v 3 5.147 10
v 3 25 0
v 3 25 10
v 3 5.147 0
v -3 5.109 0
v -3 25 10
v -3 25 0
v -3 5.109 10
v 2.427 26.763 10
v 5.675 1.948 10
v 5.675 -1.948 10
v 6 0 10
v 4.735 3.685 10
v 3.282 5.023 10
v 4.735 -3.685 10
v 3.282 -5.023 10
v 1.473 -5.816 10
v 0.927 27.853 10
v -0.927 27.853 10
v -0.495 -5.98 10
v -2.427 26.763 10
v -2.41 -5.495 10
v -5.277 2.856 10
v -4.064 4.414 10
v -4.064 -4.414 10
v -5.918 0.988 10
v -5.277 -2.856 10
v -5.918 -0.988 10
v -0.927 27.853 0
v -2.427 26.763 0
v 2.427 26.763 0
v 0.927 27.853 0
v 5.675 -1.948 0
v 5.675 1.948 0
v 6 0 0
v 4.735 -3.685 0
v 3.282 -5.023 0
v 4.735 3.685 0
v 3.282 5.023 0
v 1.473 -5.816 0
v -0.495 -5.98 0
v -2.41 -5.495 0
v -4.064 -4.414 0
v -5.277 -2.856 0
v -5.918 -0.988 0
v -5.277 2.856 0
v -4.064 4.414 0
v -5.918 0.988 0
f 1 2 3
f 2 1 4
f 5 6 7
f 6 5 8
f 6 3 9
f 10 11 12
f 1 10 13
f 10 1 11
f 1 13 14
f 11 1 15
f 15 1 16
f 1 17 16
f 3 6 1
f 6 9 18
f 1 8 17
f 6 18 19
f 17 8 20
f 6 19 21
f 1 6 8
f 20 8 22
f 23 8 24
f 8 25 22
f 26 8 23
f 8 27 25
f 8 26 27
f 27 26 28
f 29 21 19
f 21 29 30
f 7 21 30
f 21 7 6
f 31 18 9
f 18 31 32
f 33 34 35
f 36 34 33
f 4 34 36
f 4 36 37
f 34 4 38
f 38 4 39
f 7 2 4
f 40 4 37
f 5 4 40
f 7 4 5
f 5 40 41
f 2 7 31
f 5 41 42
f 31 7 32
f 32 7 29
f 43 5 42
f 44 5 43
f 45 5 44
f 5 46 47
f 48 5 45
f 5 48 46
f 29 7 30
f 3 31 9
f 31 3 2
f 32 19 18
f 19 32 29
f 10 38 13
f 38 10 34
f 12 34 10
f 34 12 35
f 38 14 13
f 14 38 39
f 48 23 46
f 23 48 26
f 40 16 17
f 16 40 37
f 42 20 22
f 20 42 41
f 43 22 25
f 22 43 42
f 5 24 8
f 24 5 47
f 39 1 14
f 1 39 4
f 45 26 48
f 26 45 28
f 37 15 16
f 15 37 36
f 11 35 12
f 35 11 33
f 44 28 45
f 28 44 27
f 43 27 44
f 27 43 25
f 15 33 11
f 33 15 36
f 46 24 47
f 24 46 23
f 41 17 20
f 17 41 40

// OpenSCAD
// LibFile: utilities.scad
//   A collection of utilities originally developed for the OpenFlexure
//   microscope.
//   
//   (c) Richard Bowman, January 2016
//   Released under the CERN Open Hardware License

// Until we figure out a neater way to do this, I am using a commoncode
// block to include this file for the examples.  Using the Include: block
// will be confusing because we don't install it in the libraries folder
// by default...
// CommonCode:
//    use <./openscad/libs/utilities.scad>;


// Function: tiny()
// Description: 
//   This is a tiny distance. In many places, it is helpful to shift
//   surfaces by a small distance, e.g. to ensure overlap or avoid
//   degenerate points.  `tiny()` is that distance, currently 0.05.
//   
//   `tiny()` was formerly known as `d` in the code 
//   but that caused confusion with diameters.
function tiny() = 0.05;

// Function: zero_z()
// Usage: zero_z(vector)
// Description: 
//   Return a copy of a 3-element vector, with the third (z) component set to 0
function zero_z(size) = [size.x, size.y, 0]; //set the Z component of a 3-vector to 0

function if_undefined_set_default(argument, default) = is_undef(argument) ? default : argument;

// Function: translate_x()
// Usage: translate_x(dist)
// Description: 
//   Translate in the X direction.  Equivalent to `translate([dist, 0, 0])`.
module translate_x(x_tr){
    translate([x_tr, 0, 0]){
        children();
    }
}

// Function: translate_y()
// Usage: translate_y(dist)
// Description: 
//   Translate in the Y direction.  Equivalent to `translate([0, dist, 0])`.
module translate_y(y_tr){
    translate([0, y_tr, 0]){
        children();
    }
}

// Function: translate_z()
// Usage: translate_z(dist)
// Description: 
//   Translate in the Z direction.  Equivalent to `translate([0, 0, dist])`.
module translate_z(z_tr){
    translate([0, 0, z_tr]){
        children();
    }
}

// Function: rotate_x()
// Usage: rotate_x(angle)
// Description: Rotate about X axis. Equivalent to `rotate([angle, 0, 0])`.
module rotate_x(x_angle){
    rotate([x_angle, 0, 0]){
        children();
    }
}

// Function: rotate_y()
// Usage: rotate_y(angle)
// Description: Rotate about Y axis. Equivalent to `rotate([0, angle, 0])`.
module rotate_y(y_angle){
    rotate([0, y_angle, 0]){
        children();
    }
}

// Function: rotate_z()
// Usage: rotate_z(angle)
// Description: Rotate about Z axis. Equivalent to `rotate([0, 0, angle])`.
module rotate_z(z_angle){
    rotate([0, 0, z_angle]){
        children();
    }
}

// Function: reflect()
// Usage: reflect(axis)
// Arguments:
//   axis = a 2- or 3D vector giving the axis to reflect in
// Description:
//   Duplicate the children of this module, once unmodified, and
//   once mirrored about the specified axis.  The mirrored copy
//   is equivalent to `mirror(axis) children()`.
//   
//   Conveninece functions `reflect_x`, `reflect_y`, and `reflect_z`
//   are defined to reflect about the respective axes.
// Examples(3D):
//   reflect([1,0,0]) translate([10,0,0]) cube(10);
//   reflect_x() translate([10,0,0]) cube(10);
module reflect(axis){
    //reflects children about the origin, keeping the originals
    children();
    mirror(axis){
        children();
    }
}


module reflect_x(){
    //shorthand for reflecting in x
    reflect([1, 0, 0]){
        children();
    }
}

module reflect_y(){
    //shorthand for reflecting in y
    reflect([0, 1, 0]){
        children();
    }
}

module reflect_z(){
    //shorthand for reflecting in z
    reflect([0, 0, 1]){
        children();
    }
}


function vector_mirror_x(vec) = _vector_mirror_axis(vec, 0);
function vector_mirror_y(vec) = _vector_mirror_axis(vec, 1);
function vector_mirror_z(vec) = _vector_mirror_axis(vec, 2);

function _vector_mirror_axis(vec, axis_index) = [
    for (i = [0:len(vec)-1])
        if (i==axis_index)
            -vec[i]
        else
            vec[i]
];

// Module: repeat()
// Usage: repeat(delta, N, center=false)
// Arguments:
//   delta = vector specifying the displacement between adjacent copies
//   N = total number of copies
//   ---
//   center = The default, `false`, places the first copy at its original location and the last is displaced by `(N-1)*delta`.  Set to `true` to centre the copies on the original location.
// Description:
//   Create a linear arry of copies of a geometry.
// Examples:
//   repeat([10,0,0], 4) cube(5);
//   repeat([10,0,0], 4, center=true) cube(5, center=true);
module repeat(delta, N, center=false){
    //repeat children along a regular array
    center_tr = (center ?  -(N-1)/2 : 0) * delta;
    translate(center_tr){
        for(i=[0:1:(N-1)]){
            translate(i*delta){
                children();
            }
        }
    }
}

module xz_slice(y=0){
    //slice out just the part of something that sits in the XZ plane
    intersection(){
        translate_y(y){
            cube([999,2*tiny(),999],center=true);
        }
        children();
    }
}

module tube(ri, ro, h, center=false){
    difference(){
        cylinder(r=ro, h=h, center=center);
        if (center){
            cylinder(r=ri, h=h+1, center=true);
        }
        else {
            translate_z(-1){
                cylinder(r=ri, h=h+2, center=false);
            }
        }
    }
}

// Module: m4_selftap_hole()
// Usage: m4_selftap_hole(h=5)
// Description:
//   Use to create a hole for an m4 machine screw to self tap into screw using a `difference()`
//   operation. This is a triangular cross-section hole.
module m4_selftap_hole(h=10, center=false){
    // r and flat calculated from the trylinder selftap function used for years.
    // Moving to explicit tested number rather than arbitary calculations.
    trylinder(r=1.3, flat=1.73, h=h, center=center);
}

// Module: no2_selftap_hole()
// Usage: no2_selftap_hole(h=5)
// Description:
//   Use to create a hole for a No2 self-tap screw using a `difference()` operation.
//   This is a triangular cross-section hole.
module no2_selftap_hole(h=10, center=false){
    //This value for r came from test prints. ranging r from 0.3 to 0.5.
    trylinder(r=.3, flat=1.73, h=h, center=center);
}

module no2_selftap_clearancehole(h=10, center=false){
    cylinder(d=2.5, h=h, center=center);
}

module no2_selftap_counterbore(bore_h=999, hole_h=999, flip_z=false, tight=false){
    $fn = 14;
    bore_d = tight ? 4.8 : 5.6;
    generic_counterbore(bore_d=bore_d, bore_h=bore_h, hole_d=2.5, hole_h=hole_h, flip_z=flip_z);
}

// Counterbored through hole for an m3 cap screw counterbore is above z=0
// through hole is below z=0. If flip_z is used the hole is not only flipped in z,
// it is also designed so that the counterbore can print prperly upsidedown
module m3_cap_counterbore(bore_h=999, hole_h=999, flip_z=false){
    $fn = 14;
    generic_counterbore(bore_d=6.5, bore_h=bore_h, hole_d=3.5, hole_h=hole_h, flip_z=flip_z);
}

module generic_counterbore(bore_d, bore_h, hole_d, hole_h, flip_z=false){
    if (flip_z){
        hole_from_bottom(r=hole_d/2, h=hole_h, big_bottom=false);
        translate_z(-(bore_h-tiny())){
            cylinder(d=bore_d, h=bore_h+tiny());
        }
    }
    else{
        translate_z(-hole_h){
            cylinder(d=hole_d, h=hole_h+tiny());
        }
        cylinder(d=bore_d, h=bore_h);
    }
}

module nut(d,h=undef,center=false,fudge=1.18,shaft=false){
    //make a nut, for metric bolt of nominal diameter d
    //d: nominal bolt diameter (e.g. 3 for M3)
    //h: height of nut
    //center: works as for cylinder
    //fudge: multiply the diameter by this number (1.22 works when vertical)
    //shaft: include a long cylinder representing the bolt shaft, diameter=d*1.05
    height = if_undefined_set_default(h, d*0.8);
    union(){
        cylinder(h=height,center=center,r=0.9*d*fudge,$fn=6);
        if(shaft){
            cylinder(r=d/2*1.05*(fudge+1)/2,h=999,$fn=16,center=true);
        }
    }
}

module nut_from_bottom(d,h=undef,fudge=1.2,shaft=true,chamfer_r=0.75,chamfer_h=0.75){
    //make a nut, for metric bolt of nominal diameter d
    //d: nominal bolt diameter (e.g. 3 for M3)
    //h: height of nut
    //center: works as for cylinder
    //fudge: multiply the diameter by this number (1.22 works when vertical)
    //shaft: include a long cylinder representing the bolt shaft, diameter=d*1.05
    height = if_undefined_set_default(h, d*0.8);
    union(){
        cylinder(h=height,r=0.9*d*fudge,$fn=6);
        translate_z(-0.05){
            cylinder(h=chamfer_h,r1=0.9*d*fudge+chamfer_r,r2=0.9*d*fudge,$fn=6);
        }
        mirror([0,0,1]){
            cylinder(h=999,r=0.9*d*fudge+chamfer_r,$fn=6);
        }
        if(shaft){
            sr=d/2*1.05*(fudge+1)/2; //radius of shaft
            translate_z(height/2){
                cylinder(r=sr,h=999,$fn=16,center=true);
            }
            //add a little cut to the roof of the surface so the initial bridges don't have to span the hole.
            intersection(){
                union(){
                    translate_z(height){
                        cube([999,sr*2,0.5],center=true);
                    }
                    translate_z(height+0.25){
                        cube([sr*2,sr*2,0.5],center=true);
                    }
                }
                cylinder(h=height+1,r=0.9*d*fudge,$fn=6);
            }
        }
    }
}

module nut_y(d,h=undef,center=false,fudge=1.15,extra_height=0.7,shaft_length=0){
    //make a nut, for metric bolt of nominal diameter d
    //d: nominal bolt diameter (e.g. 3 for M3)
    //h: height of nut
    //center: works as for cylinder
    //fudge: multiply the diameter by this number (1.22 works when vertical)
    //shaft: include a long cylinder representing the bolt shaft, diameter=d*1.05
    height = if_undefined_set_default(h, d*0.8);
    r=0.9*d*fudge;
    union(){
        rotate([-90, 0, 0]){
            cylinder(h=height,center=center,r=r,$fn=6);
        }

        if(shaft_length > 0){
            sl = shaft_length>0 ? shaft_length : 999;
            translate_y(height/2){
                reflect_y(){
                    cylinder_with_45deg_top(h=sl,r=d/2*1.05*fudge,$fn=16,extra_height=extra_height);
                }
            }
            //Center could be used instead of reflect
        }

        // extra space on top 
        center_y = center ? -height/2 : 0;
        flat_length = 2*r*sin(30);
        center_to_flat = r*cos(30);

        translate([-flat_length/2, center_y ,0]){
            cube([flat_length, height, center_to_flat+extra_height]);
        }

    }
}

// Module: cyl_slot()
// Usage: cyl_slot(r=1, h=1, dy=2, center=false)
// Description: An elongated cylinder use to make a slot for a screw. Slot is oriented in the y direction
// Arguments:
//   r = raduis of the slots
//   h = the height
//   dy = the length of the slot (centre to centre on circles) total length is dy+2*r
//   center = if true the shape is centred on all axes.
// Examples:
//   cyl_slot(r=2, h=10, dy=20);
module cyl_slot(r=1, h=1, dy=2, center=false){

    hull(){
        repeat([0, dy, 0], 2, center=true){
            cylinder(r=r, h=h, center=center);
        }
    }
}

keyhole(10, 6, 3, 25, center=false);
// Module: keyhole()
// Usage: keyhole(h, r_hole, r_slot, l_slot, center=false)
// Arguments:
//   h = height of the keyhole shape
//   r_hole = radius of the larger hole.
//   r_slot = radius of the slot.
//   l_slot = length of the slot (y-dir), from centre of hole to centre of circle at top of slot.
//   ---
//   center = The default, `false`, Whether the shape is centred in z.
// Description:
//   Create a keyhole shaped prism. Main lobe centred at (x,y) = (0,0). Slot
//   in the y-direction.
// Examples:
//   keyhole(10, 2.5, 1.6, 5, center=false);
module keyhole(h, r_hole, r_slot, l_slot, center=false){
    translate_y(l_slot/2){
        cyl_slot(r=r_slot, h=h, dy=l_slot, center=center);
    }
    cylinder(r=r_hole, h=h, center=center);
}

// Module: unrotate()
// Usage: unrotate(rotation)
// Description: 
//   Undoing a rotation is not as simple as `rotate(-rotation)` because
//   `rotate()` applies three separate rotations in order.
//   `unrotate()` reverses this, by applying the rotations in reverse order.
// Example(3D):
//   angles = [30, 60, 45];
//   unrotate(angles) rotate(angles) cylinder(r=2, h=10);
// Example(3D):
//   // This doesn't undo the rotation as you might expect!
//   angles = [30, 60, 45];
//   rotate(-angles) rotate(angles) cylinder(r=2, h=10);
module unrotate(rotation){
    //undo a previous rotation
    //Note: this is not the same as rotate(-rotation) due to ordering.
    rotate_x(-rotation.x){
        rotate_y(-rotation.y){
            rotate_z(-rotation.z){
                children();
            }
        }
    }
}

// Module: sparse_matrix_transform()
// Usage: sparse_matrix_transform(xx=1, yy=1, zz=1, xy=0, xz=0, yx=0, yz=0, zx=0, zy=0, xt=0, yt=0, zt=0)
// Description:
//   Sometimes, a matrix transformation is the right way to get something done.
//   However, specifying a full 4x4 matrix can be a bit clumsy - especially as
//   lots of useful transformations are quite close to the identity matrix.
//   This module allows you to specify individual matrix elements.  Unspecified
//   elements will default to the identity matrix.
// Examples:
//   sparse_matrix_transform(yz=0.5) cylinder(r=5, h=20);
//   sparse_matrix_transform(zy=0.5) cylinder(r=5, h=20);
module sparse_matrix_transform(xx=1, yy=1, zz=1, xy=0, xz=0, yx=0, yz=0, zx=0, zy=0, xt=0, yt=0, zt=0){
    //Apply a matrix transformation, specifying the matrix sparsely
    //This is useful because most helpful matrices are close to the identity.
    matrix = [[xx, xy, xz, xt],
              [yx, yy, yz, yt],
              [zx, zy, zz, zt],
              [0,  0,  0,  1]];
    multmatrix(matrix){
        children();
    }
}

//TODO: What does this do? Do we still want it?
module support(size, height, baseheight=0, rotation=[0,0,0], supportangle=45, outline=false){
    //generate "support material" in the STL file for selective supporting of things
    module support_2d(){
        sw=1.0;
        sp=3;
        union(){
            if(outline){
                difference()    {
                    minkowski(){
                        children();
                        circle(r=sw,$fn=8);
                    }
                    children();
                }
            }
            intersection(){
                children();
                rotate(supportangle){
                    for(x=[-size:sp:size]){
                        translate([x,0]){
                            square([sw,2*size],center=true);
                        }
                    }
                }
            }
        }
    }

    unrotate(rotation){
        translate_z(baseheight){
            linear_extrude(height){
                support_2d(){
                    projection(){
                        rotate(rotation){
                            children();
                        }
                    }
                }
            }
        }
    }
    children();
}

module rightangle_prism(size,center=false){
    intersection(){
        cube(size,center=center);
        rotate_y(45){
            translate_x(999/2){
                cube([1,1,1]*999,center=true);
            }
        }
    }
}

// Module: sequential_hull()
// Usage: sequential_hull()
// Description: 
//   Take the convex hull between each pair in a sequence of geometries.
//   
//   `sequential_hull()` allows the construction of relatively complicated
//   shapes, by "hulling" between pairs of objects.  It must have at least
//   two child modules, though it becomes useful when you have rather more.
//   Using it in conjunction with a sequence of spheres, for example, will
//   create a wire that passes each point.
// Example:
//   sequential_hull(){
//   -- $fn=8;
//       translate([0,0,0]) sphere(2);
//       translate([0,0,15]) sphere(2);
//       translate([15,0,15]) sphere(2);
//       translate([0,15,15]) sphere(2);
//   }
// Example:
//   sequential_hull(){
//       translate([0,0,0]) cylinder(r=2, h=tiny());
//       translate([0,0,5]) cylinder(r=4, h=tiny());
//       translate([0,0,7]) cylinder(r=2, h=tiny());
//       translate([0,0,10]) cylinder(r=6, h=3);
//       translate([0,0,20]) cylinder(r=2, h=tiny());
//   }
module sequential_hull(){
    //given a sequence of >2 children, take the convex hull between each pair - a helpful, general extrusion technique.
    for(i=[0:$children-2]){
        hull(){
            children(i);
            children(i+1);
        }
    }
}

module convex_fillet(r){
    offset(r){
        offset(-r){
            children();
        }
    }
}

module concave_fillet(r){
    offset(-r){
        offset(r){
            children();
        }
    }
}

module thick_section(h=tiny(), center=false, shift=true){
    // A 3D object, corresponding to the linearly-extruded projection of another object.
    // The projection is at z=0 if shift=false, or a tiny distance above z=0 if shift=true.
    offset_thick_section(h=h, center=center, shift=shift){
        children();
    }
}
module offset_thick_section(h=tiny(), offset=0, center=false, shift=true){
    // A 3D object, corresponding to the linearly-extruded projection of another object, where
    // the projection is offset before extrusion.
    // The projection is at z=0 if shift=false, or a tiny distance above z=0 if shift=true.
    linear_extrude(h, center=center){
        offset(r=offset){
            projection(cut=true){
                translate_z(shift ? -tiny() : 0){
                    children();
                }
            }
        }
    }
}

//TODO: Give this a better name
module cylinder_with_45deg_top(h,r,center=false,extra_height=0.7){
    // Block on top of the hortizontal cylinder. Hulled with the cylinder
    // This forms a 45 degree sloped roof for printing
    top_block_dims = [2*sin(45/2)*r, 2*tiny(), h];
    top_block_z = center ? 0 : h/2;
    top_block_tr = [0, r-tiny(), top_block_z];
    union(){
        rotate([90,0,180]){
            hull(){
                cylinder(h=h,r=r,center=center);
                translate(top_block_tr){
                    cube(top_block_dims, center=true);
                }
            }
            translate(top_block_tr){
                cube(top_block_dims + [0, 2*extra_height, 0], center=true);
            }
        }
    }
}

//TODO: Find out if this is still needed, and what it is!
module feather_vertical_edges(flat_h=0.2,fin_r=0.5,fin_h=0.72,object_h=20){
    union(){
    //    children();
        minkowski(){
            intersection(){
                children();
                union(){
                    for(i=[-floor(object_h/fin_h):floor(object_h/fin_h)]){
                        translate_z(i*fin_h+flat_h*1.5){
                            cube([999,999,flat_h],center=true);
                        }
                    }
                }
            }
            cylinder(r1=0,r2=fin_r,h=fin_h-2*flat_h,$fn=8);
        }
    }
}

// Module: square_to_circle()
// Description:
//   Gradually transition from a square to a circle.
//
//   Create a stack of polygons, starting with a square and doubling the
//   number of sides each layer, until we end up with a "circle".
//   
//   Optionally, we can add a cylinder on top, matching the top layer.
// Arguments:
//   r = The radius of the nominal cylinder
//   h = The overall height of the structure
//   ---
//   layers = The number of layers (default is 4).  Each layer will have a height of `h/layers`
//   top_cylinder = The height of the top cylinder.  The top cylinder will have the same number of facets as the final layer, and the whole structure will have a height of `h + top_cylinder`.
module square_to_circle(r, h, layers=4, top_cylinder=0){
    // A stack of thin shapes, starting as a square and
    // gradually gaining sides to turn into a cylinder
    sides=[4,8,16,32,64,128,256]; //number of sides
    for(i=[0:(layers-1)]){
        rotate(180/sides[i]){
            translate_z(i*h/layers){
                cylinder(r=r/cos(180/sides[i]),h=h/layers+tiny(),$fn=sides[i]);
            }
        }
    }

    if(top_cylinder>0){
        translate_z(tiny()){
            cylinder(r=r,h=h+top_cylinder, $fn=sides[layers-1]);
        }
    }
}

// Module: hole_from_bottom()
// Usage: hole_from_bottom(r, h, base_w=-1, delta_z=0.5, layers=4, big_bottom=true)
// Description:
//   A cylinder that is gradually formed from a slot or square at the base.
//   This allows a hole to be formed in the "roof" of a void, with only
//   minimal "stringing" when printed with a fused filament fabrication printer.
//   
//   The most important thing to get right is the first layer, which should be
//   a slot, spanning the full width of the void.  This means that most competent
//   slicers will be able to correctly bridge across the void, parallel to the
//   slot.  You can set the width of the slot using `base_w`, though the neatest
//   way to do this is often with an intersection (see the example).
//   
//   Once you have bridged over the void, leaving a slot for the hole, the next
//   layer will have a square hole.  This should mean the printer bridges over
//   the slot in the layer(s) below, perpendicular to the edges.  Subsequent
//   layers will then fill in the corners, until we have a nice cylinder.
//   
//   You can set `base_w` carefully and just subtract this from the "roof" of
//   a void.  However, it is often easier to set `base_w=999` and 
//   `big_bottom=true`, then take the intersection with your void, see the 
//   example.
// Arguments:
//   r = The radius of the cylinder
//   h = The height of the cylinder
//   ---
//   base_w = The width of the slot at the bottom.  By default it will be 2*r.
//   delta_z = The thickness of the layers.  I suggest twice your printer's layer thickness is a sensible value.
//   layers = The number of steps between square and cylinder (default 4)
//   big_bottom = If true (default), add a very large volume below z=0
// Example(VPT=[0,0,10], VPR=[120, 0, 30], NoAxes):
//   difference(){
//        translate([-10, -10, 0]) cube(20); // The base structure
//   
//        intersection(){
//            cylinder(r=8, h=999, center=true); // This is our void
//   
//            // We set the height of our void by the Z position of 
//            // hole_from_bottom
//            translate([0,0,10]) hole_from_bottom(r=2, h=999, base_w=999, big_bottom=true);
//        }
//      
//        // Cut through the structure so we can see inside
//        rotate(225) translate([-99, 0, -1]) cube(999);
//    }
// Example(2D, NoAxes):
//    -- module example_1(){
//    --     difference(){
//    --         translate([-10, -10, 0]) cube(20); // The base structure
//    --     
//    --         intersection(){
//    --             cylinder(r=8, h=999, center=true); // This is our void
//    --     
//    --             // We set the height of our void by the Z position of 
//    --             // hole_from_bottom
//    --             translate([0,0,10]) hole_from_bottom(r=2, h=999, base_w=999, big_bottom=true);
//    --         }
//    --     }
//    -- }
//    // This code renders some slices through the first example
//    for(i = [0:3]){
//        z = 9.75 + 0.5*i;
//        translate([i*25, 0, 0]) projection(cut=true) translate([0,0,-z]) example_1();
//    }
// Example(3D, VPD=50):
//    hole_from_bottom(r=2, h=10, base_w=10, big_bottom=false);
// Example(3D, VPD=50):
//    hole_from_bottom(r=2, h=10, big_bottom=true);
// See Also: square_to_circle()
module hole_from_bottom(r, h, base_w=-1, delta_z=0.5, layers=4, big_bottom=true){
    // This creates a shape that can be used to create a 3D printable
    // hole in a large bridge. Builds up in layer to avoid unprintable
    // cantilevered paths.

    base = base_w>0 ? [base_w,2*r,2*delta_z] : [2*r,2*r,tiny()];
    union(){
        cube(base,center=true);
        translate_z(base.z/2-tiny()){
            square_to_circle(r, delta_z*4, layers, h-delta_z*5+tiny());
        }
        if(big_bottom){
            mirror([0,0,1]){
                cylinder(r=999,h=999,$fn=8);
            }
        }
    }
}

// Module: lighttrap_cylinder)
// Usage: lighttrap_cylinder(r1, r2, h, ridge=1.5);
// Arguments:
//   r1 = the radius of the bottom of the shape (i.e. the bottom of the bottom truncated cone)
//   r2 = the inner radius of the top of the shape (i.e. the top of the top truncated cone)
//   h = the overall height
//   ---
//   ridge = The height and change in `r` of each ridge (the angle is fixed at 45 degrees)
// Description:
//   A shape made up of truncated cones to form a christmas-tree-like shape.
//   
//   This is designed to be subtracted from a solid block, to form a light path
//   that has minimal reflections from the walls of the cut-out, because the 
//   surfaces are angled.
//   
//   NB for a nominally "straight-edged" cylinder, you must set `r2 = r1 - ridge`.
// Example:
//    lighttrap_cylinder(5, 5-1.5, 21);
// Example:
//    difference(){
//        translate([-10, -10, 0]) cube(20);
//        lighttrap_cylinder(5, 5-1.5, 21);
//        translate([-99, -999, -1]) cube(999);
//    }
module lighttrap_cylinder(r1,r2,h,ridge=1.5){
    //there must be at least one cone or we divide by zero
    n_cones = max(floor(h/ridge),1);
    cone_h = h/n_cones;

    for(i = [0 : n_cones - 1]){
        p = i/(n_cones - 1);
        section_r1 = (1-p)*r1 + p*(r2+ridge);
        section_r2 = (1-p)*(r1-ridge) + p*r2;
        translate_z(i * cone_h - tiny()){
            cylinder(r1=section_r1, r2=section_r2, h=cone_h+2*tiny());
        }
    }
}

module lighttrap_sqylinder(r1,f1,r2,f2,h,ridge=1.5){
    //A shape made up of rounded truncated pyramids to form a
    //square christmas-tree-like shape.
    //Similar to lighttrap_cylinder each section has flat sides
    //It can be subtracted from and object to create a square shaft that is
    //good for trapping stray light in an optical path. The shaft rounded
    //corners
    //r1 is radius of cuvature of the bottom of the bottom pyramid
    //f1 is the flat section of the bottom of the bottom pyramid
    //r2 is radius of cuvature of the top of the top pyramid
    //f2 is the flat section of the to of the top pyramid
    //NOTE: to make a uniform width shaft set r2==r1-ridge and f1=f2
    //ALSO NOTE: Each truncated pyramid is made by varying r, not f. As such
    //    r1 must be greater than or equal to ridge

    assert(r1>=ridge, "r1 is less than ridge this will cause the light trap to fail");
    //there must be at least one cone or we divide by zero
    n_cones = max(floor(h/ridge),1);
    cone_h = h/n_cones;

    for(i = [0 : n_cones - 1]){
        p = i/(n_cones - 1);
        section_r1 = (1-p)*r1 + p*(r2+ridge);
        section_r2 = (1-p)*(r1-ridge) + p*r2;
        section_flat_l = ((1-p)*f1 + p*f2);
        translate_z(i * cone_h - tiny()){
            minkowski(){
                cylinder(r1=section_r1, r2=section_r2, h=cone_h);
                cube([section_flat_l, section_flat_l, 2*tiny()], center=true);
            }
        }
    }
}

module trylinder(r=1, flat=1, h=tiny(), center=false){
    //Triangular prism with filleted corners
    //NOTE the largest cylinder that fits inside it has r=r+f/(2*sqrt(3))
    //One of the sides is parallel with the X axis
    hull(){
        for(a=[0,120,240]){
            rotate(a){
                translate_y(flat/sqrt(3)){
                    cylinder(r=r, h=h, center=center);
                }
            }
        }
    }
}

module trylinder_selftap(nominal_d=3, h=10, center=false){
    // Make a trylinder that you can self-tap a machine screw into.
    // The size is deliberately a bit big for small holes, so that
    // it compensates for splodgy printing
    /*echo("Warning: `trylinder_selftap` is no longer recommended for use.");
    echo("Use explicitlt defined holes such as `m4_selftap_hole` for screw sizes M4 and above.");
    echo("Use explicit holes for self tap screws, such as `no2_selftap_hole`");
    echo("For machine screws smaller than M4 use nut traps to avoid thread stripping.");*/
    r = max(nominal_d*0.8/2 + 0.2, nominal_d/2 - 0.2);
    dr = 0.5;
    flat = dr * 2 * sqrt(3);
    trylinder(r=r - dr, flat=flat, h=h, center=center);
}


module trylinder_gripper(inner_r=10,h=6,grip_h=3.5,base_r=-1,t=0.65,squeeze=1,flare=0.8,solid=false){
    // This creates a tapering, distorted hollow cylinder suitable for
    // gripping a small cylindrical (or spherical) object
    // The gripping occurs grip_h above the base, and it flares out
    // again both above and below this.
    // inner_r: radius of the cylinder we're gripping
    // h: overall height of the gripper
    // grip_h: height of the part where the gripper touches the cylinder
    // base_r: radius of the (cylindrical) bottom
    // t: thickness of the walls
    // squeeze: how far the wall must be distorted to fit the cylinder
    // flare: how much larger the top is than the gripping part
    // solid: if true, make a solid outline of the gripper
    $fn=48;
    bottom_r=base_r>0?base_r:inner_r+1+t;

    //TODO: reduce repition
    difference(){
        sequential_hull(){
            cylinder(r=bottom_r,h=tiny());
            translate_z(grip_h-0.5){
                trylinder(r=inner_r-squeeze+t,flat=2.5*squeeze,h=tiny());
            }
            translate_z(grip_h+0.5){
                trylinder(r=inner_r-squeeze+t,flat=2.5*squeeze,h=tiny());
            }
            translate_z(h-tiny()){
                trylinder(r=inner_r-squeeze+flare+t,flat=2.5*squeeze,h=tiny());
            }
        }
        if(solid==false){
            sequential_hull(){
                translate_z(-tiny()){
                    cylinder(r=bottom_r-t,h=tiny());
                }
                translate_z(grip_h-0.5){
                    trylinder(r=inner_r-squeeze,flat=2.5*squeeze,h=tiny());
                }
                translate_z(grip_h+0.5){
                    trylinder(r=inner_r-squeeze,flat=2.5*squeeze,h=tiny());
                }
                translate_z(h){
                    trylinder(r=inner_r-squeeze+flare,flat=2.5*squeeze,h=tiny());
                }
            }
        }
    }
}

module deformable_hole_trylinder(r1, r2, h=99, corner_roc=undef, delta_z=0.5, center=false){
    // A cylinder with feathered edges, to make a hole that is
    // slightly deformable, in an otherwise rigid structure.
    // r1: inner radius
    // r2: outer radius
    // h, center: as for cylinder
    // corner_roc: radius of curvature of the trylinder
    // delta_z: thickness of layers
    n = floor(h/(2*delta_z)); //number of layers in the structure
    flat_l = 2*sqrt(r2*r2 - r1*r1);
    default_corner_radius = r1 - flat_l/(2*sqrt(3));
    corner_radius = if_undefined_set_default(corner_roc, default_corner_radius);
    repeat([0,0,2*delta_z], n, center=center){
        union(){
            cylinder(r=r2, h=delta_z+tiny());
            translate_z(center ? -delta_z : delta_z){
                trylinder(r=corner_radius, flat=flat_l, h=delta_z+tiny());
            }
        }
    }
}


module exterior_brim(r=4, h=0.2, brim_only=false, smooth_r=undef){
    // Add a "brim" around the outside of an object *only*, preserving holes in the object
    // brim width r and the smoothing smooth_r can be defined separately, but default to equal

    _smooth_r = is_undef(smooth_r) ? r : smooth_r;

    if (!brim_only){
        children();
    }

    if(r > 0){
        linear_extrude(h){
            difference(){
                offset(r){
                    offset(-_smooth_r){
                        offset(_smooth_r){
                            projection(cut=true){
                                translate_z(-tiny()){
                                    children();
                                }
                            }
                        }
                    }
                }
                offset(-_smooth_r+tiny()){
                    offset(_smooth_r){
                        projection(cut=true){
                            translate_z(-tiny()){
                                children();
                            }
                        }
                    }
                }
            }
        }
    }
}

module external_fillet_2d(r=3)
{
    offset(r=r){
        offset(r=-r){
            children();
        }
    }
}

module internal_fillet_2d(r=3)
{
    offset(r=-r){
        offset(r=r){
            children();
        }
    }
}

module fillet_2d(r=3)
{
    external_fillet_2d(r=r){
        internal_fillet_2d(r=r){
            children();
        }
    }
}
